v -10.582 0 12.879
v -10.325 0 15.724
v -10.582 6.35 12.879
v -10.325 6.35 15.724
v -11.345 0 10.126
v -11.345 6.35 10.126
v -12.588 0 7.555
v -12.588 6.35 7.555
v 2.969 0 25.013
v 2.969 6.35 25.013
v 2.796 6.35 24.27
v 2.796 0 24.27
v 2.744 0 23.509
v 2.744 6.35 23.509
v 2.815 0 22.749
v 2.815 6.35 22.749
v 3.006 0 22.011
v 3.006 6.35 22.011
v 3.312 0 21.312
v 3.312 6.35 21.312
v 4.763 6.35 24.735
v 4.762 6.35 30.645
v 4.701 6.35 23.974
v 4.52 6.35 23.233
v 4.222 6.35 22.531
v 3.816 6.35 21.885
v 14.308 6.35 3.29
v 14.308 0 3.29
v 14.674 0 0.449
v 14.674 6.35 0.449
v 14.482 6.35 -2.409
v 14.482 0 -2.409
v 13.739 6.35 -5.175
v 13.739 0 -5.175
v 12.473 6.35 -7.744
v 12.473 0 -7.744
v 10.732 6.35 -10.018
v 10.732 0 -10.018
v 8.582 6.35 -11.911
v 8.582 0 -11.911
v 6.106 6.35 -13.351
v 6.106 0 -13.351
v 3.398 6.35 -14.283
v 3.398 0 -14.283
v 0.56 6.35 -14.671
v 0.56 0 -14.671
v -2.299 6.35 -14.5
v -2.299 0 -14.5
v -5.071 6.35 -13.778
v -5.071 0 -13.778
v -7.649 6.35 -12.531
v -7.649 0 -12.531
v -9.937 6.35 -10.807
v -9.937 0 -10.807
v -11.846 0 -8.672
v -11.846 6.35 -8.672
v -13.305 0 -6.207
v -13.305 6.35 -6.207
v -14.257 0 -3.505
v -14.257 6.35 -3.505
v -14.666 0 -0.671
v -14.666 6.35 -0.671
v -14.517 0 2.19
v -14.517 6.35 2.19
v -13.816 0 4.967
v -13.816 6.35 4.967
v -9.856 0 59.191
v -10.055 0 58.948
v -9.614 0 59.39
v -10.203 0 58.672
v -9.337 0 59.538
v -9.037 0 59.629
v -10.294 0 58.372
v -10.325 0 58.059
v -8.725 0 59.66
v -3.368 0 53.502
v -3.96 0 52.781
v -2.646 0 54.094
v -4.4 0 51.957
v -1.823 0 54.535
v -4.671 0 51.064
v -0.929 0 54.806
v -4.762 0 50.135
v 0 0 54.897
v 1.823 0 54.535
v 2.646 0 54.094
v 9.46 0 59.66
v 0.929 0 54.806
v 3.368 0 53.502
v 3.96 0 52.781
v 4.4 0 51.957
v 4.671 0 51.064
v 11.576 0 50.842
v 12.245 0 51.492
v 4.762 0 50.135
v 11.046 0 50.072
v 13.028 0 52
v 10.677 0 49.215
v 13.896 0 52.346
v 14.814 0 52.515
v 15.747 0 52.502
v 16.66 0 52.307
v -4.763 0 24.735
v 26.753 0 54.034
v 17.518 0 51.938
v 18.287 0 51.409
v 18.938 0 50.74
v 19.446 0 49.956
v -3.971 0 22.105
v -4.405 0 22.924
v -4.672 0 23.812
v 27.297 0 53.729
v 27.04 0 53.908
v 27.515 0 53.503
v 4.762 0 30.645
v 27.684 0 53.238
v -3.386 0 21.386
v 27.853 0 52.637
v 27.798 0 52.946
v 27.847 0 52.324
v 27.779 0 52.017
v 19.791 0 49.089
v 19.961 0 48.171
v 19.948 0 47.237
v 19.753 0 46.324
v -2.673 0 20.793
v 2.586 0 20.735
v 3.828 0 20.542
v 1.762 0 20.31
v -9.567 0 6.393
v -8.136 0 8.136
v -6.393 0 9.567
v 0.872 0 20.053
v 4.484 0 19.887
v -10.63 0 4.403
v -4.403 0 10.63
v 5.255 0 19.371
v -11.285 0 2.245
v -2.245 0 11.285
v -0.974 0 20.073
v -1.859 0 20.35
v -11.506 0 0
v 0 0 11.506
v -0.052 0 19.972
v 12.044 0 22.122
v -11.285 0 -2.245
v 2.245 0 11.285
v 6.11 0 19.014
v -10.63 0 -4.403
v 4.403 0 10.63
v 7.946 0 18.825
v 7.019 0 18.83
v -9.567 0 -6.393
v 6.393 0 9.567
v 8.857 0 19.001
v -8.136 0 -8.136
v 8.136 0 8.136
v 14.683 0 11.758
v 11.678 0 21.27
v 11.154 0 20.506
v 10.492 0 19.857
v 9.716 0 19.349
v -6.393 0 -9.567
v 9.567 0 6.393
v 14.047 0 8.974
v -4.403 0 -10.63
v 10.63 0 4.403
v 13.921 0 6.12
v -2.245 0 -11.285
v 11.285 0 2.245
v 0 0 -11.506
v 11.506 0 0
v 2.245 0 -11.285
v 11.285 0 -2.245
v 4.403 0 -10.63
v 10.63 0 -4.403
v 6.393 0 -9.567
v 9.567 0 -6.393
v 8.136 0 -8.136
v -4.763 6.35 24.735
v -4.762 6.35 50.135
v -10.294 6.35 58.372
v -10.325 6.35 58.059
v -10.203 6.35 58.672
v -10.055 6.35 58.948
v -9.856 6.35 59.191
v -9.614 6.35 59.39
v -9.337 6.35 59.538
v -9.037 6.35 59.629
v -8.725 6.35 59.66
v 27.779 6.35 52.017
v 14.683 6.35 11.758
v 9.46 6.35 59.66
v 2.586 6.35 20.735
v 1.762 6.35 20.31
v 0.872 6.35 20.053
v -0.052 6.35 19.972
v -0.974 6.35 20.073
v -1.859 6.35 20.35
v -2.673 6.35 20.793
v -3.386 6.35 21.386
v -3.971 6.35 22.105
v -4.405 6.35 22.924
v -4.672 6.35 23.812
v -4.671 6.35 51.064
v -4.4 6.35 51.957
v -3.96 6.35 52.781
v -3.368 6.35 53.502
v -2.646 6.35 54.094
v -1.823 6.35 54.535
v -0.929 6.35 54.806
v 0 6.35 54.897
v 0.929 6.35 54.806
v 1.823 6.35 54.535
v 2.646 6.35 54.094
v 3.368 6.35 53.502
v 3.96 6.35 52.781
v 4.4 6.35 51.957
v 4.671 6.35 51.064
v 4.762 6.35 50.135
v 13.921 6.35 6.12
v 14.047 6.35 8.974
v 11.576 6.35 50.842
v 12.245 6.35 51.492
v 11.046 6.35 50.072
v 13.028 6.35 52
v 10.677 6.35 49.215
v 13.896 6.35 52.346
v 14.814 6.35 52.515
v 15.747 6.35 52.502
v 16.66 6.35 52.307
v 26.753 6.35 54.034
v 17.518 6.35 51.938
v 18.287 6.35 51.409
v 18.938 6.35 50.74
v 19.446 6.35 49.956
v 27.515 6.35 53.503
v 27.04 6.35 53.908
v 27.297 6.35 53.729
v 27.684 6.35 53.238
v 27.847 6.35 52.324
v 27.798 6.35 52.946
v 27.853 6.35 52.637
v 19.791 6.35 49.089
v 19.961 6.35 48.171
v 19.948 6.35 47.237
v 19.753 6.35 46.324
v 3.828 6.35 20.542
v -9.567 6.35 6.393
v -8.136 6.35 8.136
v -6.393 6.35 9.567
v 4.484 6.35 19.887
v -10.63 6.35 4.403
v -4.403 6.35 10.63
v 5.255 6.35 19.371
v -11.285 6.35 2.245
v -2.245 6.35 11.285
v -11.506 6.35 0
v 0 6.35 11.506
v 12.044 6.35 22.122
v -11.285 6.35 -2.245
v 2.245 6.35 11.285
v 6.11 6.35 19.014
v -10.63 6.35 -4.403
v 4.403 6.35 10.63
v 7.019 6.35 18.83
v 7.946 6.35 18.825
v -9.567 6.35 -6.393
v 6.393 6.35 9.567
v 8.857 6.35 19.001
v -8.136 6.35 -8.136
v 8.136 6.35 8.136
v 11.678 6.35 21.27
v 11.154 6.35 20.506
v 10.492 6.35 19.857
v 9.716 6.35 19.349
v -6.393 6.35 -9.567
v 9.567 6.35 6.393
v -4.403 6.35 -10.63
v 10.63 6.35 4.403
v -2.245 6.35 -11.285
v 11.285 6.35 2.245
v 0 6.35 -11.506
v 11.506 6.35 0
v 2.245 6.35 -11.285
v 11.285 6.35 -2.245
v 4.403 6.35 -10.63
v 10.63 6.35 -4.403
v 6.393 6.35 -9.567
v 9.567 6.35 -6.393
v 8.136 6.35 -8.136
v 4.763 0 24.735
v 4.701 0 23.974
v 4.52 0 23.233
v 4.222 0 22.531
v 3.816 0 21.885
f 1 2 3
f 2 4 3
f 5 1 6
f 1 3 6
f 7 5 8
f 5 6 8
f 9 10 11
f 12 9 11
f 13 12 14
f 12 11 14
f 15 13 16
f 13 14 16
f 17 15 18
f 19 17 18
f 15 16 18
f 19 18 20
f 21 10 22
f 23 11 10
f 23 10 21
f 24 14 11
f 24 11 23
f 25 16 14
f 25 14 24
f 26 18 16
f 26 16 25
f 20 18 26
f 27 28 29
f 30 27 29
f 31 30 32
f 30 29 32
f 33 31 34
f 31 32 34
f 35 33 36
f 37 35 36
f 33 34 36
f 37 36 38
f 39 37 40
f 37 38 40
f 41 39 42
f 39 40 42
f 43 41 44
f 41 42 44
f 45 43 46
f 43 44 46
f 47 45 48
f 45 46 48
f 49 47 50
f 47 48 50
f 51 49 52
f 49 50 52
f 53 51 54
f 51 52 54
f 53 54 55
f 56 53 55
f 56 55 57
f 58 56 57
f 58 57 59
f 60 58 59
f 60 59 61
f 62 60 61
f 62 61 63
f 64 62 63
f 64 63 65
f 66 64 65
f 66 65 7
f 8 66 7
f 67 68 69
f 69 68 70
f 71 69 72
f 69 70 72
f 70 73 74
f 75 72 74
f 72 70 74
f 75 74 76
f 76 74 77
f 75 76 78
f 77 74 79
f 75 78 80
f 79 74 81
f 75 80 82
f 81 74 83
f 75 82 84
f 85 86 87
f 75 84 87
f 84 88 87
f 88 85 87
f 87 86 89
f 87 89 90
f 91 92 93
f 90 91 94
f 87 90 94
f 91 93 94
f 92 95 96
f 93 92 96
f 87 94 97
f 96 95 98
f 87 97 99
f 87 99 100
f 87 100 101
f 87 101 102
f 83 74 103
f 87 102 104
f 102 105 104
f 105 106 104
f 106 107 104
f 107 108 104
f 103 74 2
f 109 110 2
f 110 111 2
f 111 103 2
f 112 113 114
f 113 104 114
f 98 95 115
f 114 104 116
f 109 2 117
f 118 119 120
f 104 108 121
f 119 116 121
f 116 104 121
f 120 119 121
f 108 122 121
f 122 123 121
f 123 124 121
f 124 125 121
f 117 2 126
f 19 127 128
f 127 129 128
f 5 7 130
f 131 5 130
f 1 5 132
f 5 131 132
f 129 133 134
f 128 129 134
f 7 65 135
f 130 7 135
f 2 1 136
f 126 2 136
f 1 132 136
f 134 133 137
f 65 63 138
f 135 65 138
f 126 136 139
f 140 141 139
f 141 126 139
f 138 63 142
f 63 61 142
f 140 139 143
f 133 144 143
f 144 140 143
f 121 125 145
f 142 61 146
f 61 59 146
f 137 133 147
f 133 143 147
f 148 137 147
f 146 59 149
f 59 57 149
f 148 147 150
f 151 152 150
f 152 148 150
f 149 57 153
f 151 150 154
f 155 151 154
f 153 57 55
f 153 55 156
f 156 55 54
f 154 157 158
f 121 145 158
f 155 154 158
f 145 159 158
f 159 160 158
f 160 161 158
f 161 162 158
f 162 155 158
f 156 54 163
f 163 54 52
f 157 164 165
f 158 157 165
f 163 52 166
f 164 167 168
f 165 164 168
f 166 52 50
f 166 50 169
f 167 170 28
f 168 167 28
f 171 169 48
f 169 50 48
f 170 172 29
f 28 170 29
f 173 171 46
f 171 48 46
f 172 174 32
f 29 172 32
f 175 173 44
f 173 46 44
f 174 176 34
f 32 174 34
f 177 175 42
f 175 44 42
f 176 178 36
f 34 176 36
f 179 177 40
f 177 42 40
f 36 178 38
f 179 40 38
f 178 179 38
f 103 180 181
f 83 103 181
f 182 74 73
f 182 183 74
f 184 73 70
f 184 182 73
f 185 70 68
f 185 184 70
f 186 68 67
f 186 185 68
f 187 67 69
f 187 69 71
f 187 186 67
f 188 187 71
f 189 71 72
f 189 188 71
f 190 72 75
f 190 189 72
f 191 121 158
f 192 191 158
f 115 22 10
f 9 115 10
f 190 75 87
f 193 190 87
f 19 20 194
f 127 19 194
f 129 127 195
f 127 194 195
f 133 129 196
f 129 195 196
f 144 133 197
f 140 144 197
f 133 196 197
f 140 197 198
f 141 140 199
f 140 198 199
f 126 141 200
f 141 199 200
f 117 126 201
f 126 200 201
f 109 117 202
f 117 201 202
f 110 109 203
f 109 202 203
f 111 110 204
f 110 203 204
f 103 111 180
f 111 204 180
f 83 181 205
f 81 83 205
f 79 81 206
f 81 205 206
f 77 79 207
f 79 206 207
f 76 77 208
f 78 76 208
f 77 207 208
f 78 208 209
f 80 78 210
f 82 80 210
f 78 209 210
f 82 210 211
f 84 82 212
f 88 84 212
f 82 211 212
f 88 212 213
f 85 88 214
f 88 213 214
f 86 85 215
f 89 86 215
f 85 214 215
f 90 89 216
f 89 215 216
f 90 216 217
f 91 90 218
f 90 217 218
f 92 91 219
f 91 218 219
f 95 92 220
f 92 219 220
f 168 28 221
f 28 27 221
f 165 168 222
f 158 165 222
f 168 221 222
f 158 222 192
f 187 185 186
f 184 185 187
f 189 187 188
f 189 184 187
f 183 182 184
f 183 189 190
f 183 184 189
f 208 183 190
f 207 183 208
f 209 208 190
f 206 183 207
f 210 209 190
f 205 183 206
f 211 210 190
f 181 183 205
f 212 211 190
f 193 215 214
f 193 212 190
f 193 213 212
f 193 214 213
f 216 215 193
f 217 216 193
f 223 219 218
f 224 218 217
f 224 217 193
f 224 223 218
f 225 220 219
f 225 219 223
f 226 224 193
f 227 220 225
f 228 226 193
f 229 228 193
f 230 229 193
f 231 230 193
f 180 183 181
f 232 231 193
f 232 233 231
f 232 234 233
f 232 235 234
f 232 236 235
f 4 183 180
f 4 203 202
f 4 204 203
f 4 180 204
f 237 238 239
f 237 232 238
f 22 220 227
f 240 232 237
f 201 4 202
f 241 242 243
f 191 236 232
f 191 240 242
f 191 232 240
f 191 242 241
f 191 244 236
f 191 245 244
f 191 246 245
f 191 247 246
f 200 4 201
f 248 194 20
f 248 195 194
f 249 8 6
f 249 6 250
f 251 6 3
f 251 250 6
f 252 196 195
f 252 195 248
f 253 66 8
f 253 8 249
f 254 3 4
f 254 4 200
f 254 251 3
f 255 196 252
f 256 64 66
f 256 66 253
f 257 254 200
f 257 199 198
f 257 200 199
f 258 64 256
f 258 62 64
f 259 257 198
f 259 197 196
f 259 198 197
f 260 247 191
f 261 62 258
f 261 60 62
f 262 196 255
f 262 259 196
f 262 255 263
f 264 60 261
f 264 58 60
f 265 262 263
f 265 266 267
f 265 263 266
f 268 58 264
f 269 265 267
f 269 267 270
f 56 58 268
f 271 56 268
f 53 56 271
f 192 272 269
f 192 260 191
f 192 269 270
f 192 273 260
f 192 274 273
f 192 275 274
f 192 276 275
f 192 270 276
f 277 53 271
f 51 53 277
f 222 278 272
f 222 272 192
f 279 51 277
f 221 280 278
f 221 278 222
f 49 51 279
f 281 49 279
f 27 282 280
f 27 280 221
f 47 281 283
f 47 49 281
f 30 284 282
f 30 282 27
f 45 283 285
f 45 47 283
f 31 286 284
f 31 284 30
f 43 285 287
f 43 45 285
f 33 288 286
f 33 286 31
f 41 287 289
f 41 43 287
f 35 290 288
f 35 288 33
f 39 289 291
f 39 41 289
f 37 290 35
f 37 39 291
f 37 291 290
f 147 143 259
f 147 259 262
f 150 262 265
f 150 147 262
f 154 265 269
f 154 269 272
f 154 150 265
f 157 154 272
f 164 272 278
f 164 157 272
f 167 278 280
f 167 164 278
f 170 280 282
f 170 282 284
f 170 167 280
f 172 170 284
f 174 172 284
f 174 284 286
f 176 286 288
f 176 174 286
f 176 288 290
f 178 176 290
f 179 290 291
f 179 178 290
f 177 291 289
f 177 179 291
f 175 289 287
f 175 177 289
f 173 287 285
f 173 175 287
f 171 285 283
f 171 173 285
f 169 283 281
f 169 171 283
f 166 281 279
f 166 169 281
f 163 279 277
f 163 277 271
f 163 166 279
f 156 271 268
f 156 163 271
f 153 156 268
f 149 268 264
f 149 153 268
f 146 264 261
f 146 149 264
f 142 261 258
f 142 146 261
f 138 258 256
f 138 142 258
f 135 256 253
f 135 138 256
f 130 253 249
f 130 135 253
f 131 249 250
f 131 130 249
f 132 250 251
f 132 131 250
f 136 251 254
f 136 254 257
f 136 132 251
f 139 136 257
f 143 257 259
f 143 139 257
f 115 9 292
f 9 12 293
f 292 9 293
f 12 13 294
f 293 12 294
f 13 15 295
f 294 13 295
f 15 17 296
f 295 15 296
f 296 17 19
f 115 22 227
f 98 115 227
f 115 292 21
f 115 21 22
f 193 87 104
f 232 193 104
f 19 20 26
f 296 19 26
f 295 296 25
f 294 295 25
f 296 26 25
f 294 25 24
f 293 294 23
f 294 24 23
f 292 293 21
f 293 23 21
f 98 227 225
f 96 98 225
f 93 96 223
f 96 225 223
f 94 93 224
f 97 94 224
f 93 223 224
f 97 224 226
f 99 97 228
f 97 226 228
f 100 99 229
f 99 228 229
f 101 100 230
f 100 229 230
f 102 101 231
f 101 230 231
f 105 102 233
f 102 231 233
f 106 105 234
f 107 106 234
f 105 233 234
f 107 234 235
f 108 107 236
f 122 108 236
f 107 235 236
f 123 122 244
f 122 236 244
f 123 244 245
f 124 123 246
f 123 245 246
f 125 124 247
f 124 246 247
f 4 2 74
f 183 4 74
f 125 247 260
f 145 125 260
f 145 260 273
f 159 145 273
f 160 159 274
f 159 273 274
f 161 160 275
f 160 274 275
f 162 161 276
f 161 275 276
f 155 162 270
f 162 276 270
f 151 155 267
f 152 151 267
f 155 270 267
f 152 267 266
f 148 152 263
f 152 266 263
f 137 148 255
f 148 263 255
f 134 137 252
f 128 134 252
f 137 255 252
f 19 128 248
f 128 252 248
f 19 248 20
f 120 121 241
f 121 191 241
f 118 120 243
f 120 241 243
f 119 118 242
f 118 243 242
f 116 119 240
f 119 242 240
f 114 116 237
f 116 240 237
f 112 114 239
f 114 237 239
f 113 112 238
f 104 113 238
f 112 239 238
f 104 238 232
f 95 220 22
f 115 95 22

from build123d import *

# Parameters (mm, degrees)
SKETCH1_R           = 11.5062
BOSS_EXTRUDE1_DEPTH = 6.35
FILLET1_R           = 1.6002
FILLET2_R           = 15.875
CUT_EXTRUDE1_DEPTH  = 6.35


with BuildPart() as part:
    # Sketch1 → Boss-Extrude1 (new body)
    with BuildSketch(Plane(origin=(0, 0, 0), x_dir=(1, 0, 0), z_dir=(0, 1, 0))):
        with BuildLine():
            Line((-10.3251, -10.436950868), (-10.3251, -59.659625888))
            Line((-10.3251, -59.659625888), (9.459830419, -59.659625888))
            Line((9.459830419, -59.659625888), (28.274282324, -53.539178236))
            Line((28.274282324, -53.539178236), (13.047299162, -6.730944809))
            ThreePointArc((13.047299162, -6.730944809), (-2.299176439, 14.500049005), (-10.3251, -10.436950868))
        make_face()
        with Locations(Location((0, 0, 0), (0, 0, 270))):
            Circle(SKETCH1_R, mode=Mode.SUBTRACT)
    extrude(amount=BOSS_EXTRUDE1_DEPTH)

    # Fillet1
    fillet1_edges = [part.edges().sort_by_distance(p)[0] for p in [
        (28.274282324, 3.175, 53.539178236),
        (-10.3251, 3.175, 59.659625888),
    ]]
    fillet(fillet1_edges, radius=FILLET1_R)

    # Fillet2
    fillet2_edges = [part.edges().sort_by_distance(p)[0] for p in [
        (13.047299162, 3.175, 6.730944809),
        (-10.3251, 3.175, 10.436950868),
    ]]
    fillet(fillet2_edges, radius=FILLET2_R)

    # Sketch2 → Cut-Extrude1 (cut)
    with BuildSketch(Plane(origin=(0, 6.35, 0), x_dir=(1, 0, 0), z_dir=(0, 1, 0))):
        with BuildLine():
            Line((-4.7625, -24.734625888), (-4.7625, -50.134625888))
            ThreePointArc((-4.7625, -50.134625888), (0, -54.897125888), (4.7625, -50.134625888))
            Line((4.7625, -50.134625888), (4.7625, -30.645176967))
            Line((4.7625, -30.645176967), (2.968585925, -25.012937053))
            ThreePointArc((2.968585925, -25.012937053), (2.764324982, -23.127703518), (3.311866053, -21.312207226))
            ThreePointArc((3.311866053, -21.312207226), (-1.858580664, -20.349755974), (-4.7625, -24.734625888))
        make_face()
        with BuildLine():
            ThreePointArc((12.044347964, -22.122233262), (7.946348584, -18.825443195), (3.311866053, -21.312207226))
            ThreePointArc((3.311866053, -21.312207226), (4.384869914, -22.876045223), (4.7625, -24.734625888))
            Line((4.7625, -24.734625888), (4.7625, -30.645176967))
            Line((4.7625, -30.645176967), (10.677129365, -49.214969158))
            ThreePointArc((10.677129365, -49.214969158), (16.66036228, -52.307498282), (19.752891405, -46.324265367))
            Line((19.752891405, -46.324265367), (12.044347964, -22.122233262))
        make_face()
    extrude(amount=-CUT_EXTRUDE1_DEPTH, mode=Mode.SUBTRACT)


with BuildPart() as cut_extrude1_piece_1:
    # of the separate pieces the step leaves, piece 1, a body of its own (cut_extrude1_pieces)
    add(part.part.solids().sort_by_distance((-10.3251, 0, 15.723743779))[0])


with BuildPart() as cut_extrude1_piece_2:
    # of the separate pieces the step leaves, piece 2, a body of its own (cut_extrude1_pieces)
    add(part.part.solids().sort_by_distance((4.7625, 0, 24.734625888))[0])


solid = Compound([cut_extrude1_piece_1.part, cut_extrude1_piece_2.part])
